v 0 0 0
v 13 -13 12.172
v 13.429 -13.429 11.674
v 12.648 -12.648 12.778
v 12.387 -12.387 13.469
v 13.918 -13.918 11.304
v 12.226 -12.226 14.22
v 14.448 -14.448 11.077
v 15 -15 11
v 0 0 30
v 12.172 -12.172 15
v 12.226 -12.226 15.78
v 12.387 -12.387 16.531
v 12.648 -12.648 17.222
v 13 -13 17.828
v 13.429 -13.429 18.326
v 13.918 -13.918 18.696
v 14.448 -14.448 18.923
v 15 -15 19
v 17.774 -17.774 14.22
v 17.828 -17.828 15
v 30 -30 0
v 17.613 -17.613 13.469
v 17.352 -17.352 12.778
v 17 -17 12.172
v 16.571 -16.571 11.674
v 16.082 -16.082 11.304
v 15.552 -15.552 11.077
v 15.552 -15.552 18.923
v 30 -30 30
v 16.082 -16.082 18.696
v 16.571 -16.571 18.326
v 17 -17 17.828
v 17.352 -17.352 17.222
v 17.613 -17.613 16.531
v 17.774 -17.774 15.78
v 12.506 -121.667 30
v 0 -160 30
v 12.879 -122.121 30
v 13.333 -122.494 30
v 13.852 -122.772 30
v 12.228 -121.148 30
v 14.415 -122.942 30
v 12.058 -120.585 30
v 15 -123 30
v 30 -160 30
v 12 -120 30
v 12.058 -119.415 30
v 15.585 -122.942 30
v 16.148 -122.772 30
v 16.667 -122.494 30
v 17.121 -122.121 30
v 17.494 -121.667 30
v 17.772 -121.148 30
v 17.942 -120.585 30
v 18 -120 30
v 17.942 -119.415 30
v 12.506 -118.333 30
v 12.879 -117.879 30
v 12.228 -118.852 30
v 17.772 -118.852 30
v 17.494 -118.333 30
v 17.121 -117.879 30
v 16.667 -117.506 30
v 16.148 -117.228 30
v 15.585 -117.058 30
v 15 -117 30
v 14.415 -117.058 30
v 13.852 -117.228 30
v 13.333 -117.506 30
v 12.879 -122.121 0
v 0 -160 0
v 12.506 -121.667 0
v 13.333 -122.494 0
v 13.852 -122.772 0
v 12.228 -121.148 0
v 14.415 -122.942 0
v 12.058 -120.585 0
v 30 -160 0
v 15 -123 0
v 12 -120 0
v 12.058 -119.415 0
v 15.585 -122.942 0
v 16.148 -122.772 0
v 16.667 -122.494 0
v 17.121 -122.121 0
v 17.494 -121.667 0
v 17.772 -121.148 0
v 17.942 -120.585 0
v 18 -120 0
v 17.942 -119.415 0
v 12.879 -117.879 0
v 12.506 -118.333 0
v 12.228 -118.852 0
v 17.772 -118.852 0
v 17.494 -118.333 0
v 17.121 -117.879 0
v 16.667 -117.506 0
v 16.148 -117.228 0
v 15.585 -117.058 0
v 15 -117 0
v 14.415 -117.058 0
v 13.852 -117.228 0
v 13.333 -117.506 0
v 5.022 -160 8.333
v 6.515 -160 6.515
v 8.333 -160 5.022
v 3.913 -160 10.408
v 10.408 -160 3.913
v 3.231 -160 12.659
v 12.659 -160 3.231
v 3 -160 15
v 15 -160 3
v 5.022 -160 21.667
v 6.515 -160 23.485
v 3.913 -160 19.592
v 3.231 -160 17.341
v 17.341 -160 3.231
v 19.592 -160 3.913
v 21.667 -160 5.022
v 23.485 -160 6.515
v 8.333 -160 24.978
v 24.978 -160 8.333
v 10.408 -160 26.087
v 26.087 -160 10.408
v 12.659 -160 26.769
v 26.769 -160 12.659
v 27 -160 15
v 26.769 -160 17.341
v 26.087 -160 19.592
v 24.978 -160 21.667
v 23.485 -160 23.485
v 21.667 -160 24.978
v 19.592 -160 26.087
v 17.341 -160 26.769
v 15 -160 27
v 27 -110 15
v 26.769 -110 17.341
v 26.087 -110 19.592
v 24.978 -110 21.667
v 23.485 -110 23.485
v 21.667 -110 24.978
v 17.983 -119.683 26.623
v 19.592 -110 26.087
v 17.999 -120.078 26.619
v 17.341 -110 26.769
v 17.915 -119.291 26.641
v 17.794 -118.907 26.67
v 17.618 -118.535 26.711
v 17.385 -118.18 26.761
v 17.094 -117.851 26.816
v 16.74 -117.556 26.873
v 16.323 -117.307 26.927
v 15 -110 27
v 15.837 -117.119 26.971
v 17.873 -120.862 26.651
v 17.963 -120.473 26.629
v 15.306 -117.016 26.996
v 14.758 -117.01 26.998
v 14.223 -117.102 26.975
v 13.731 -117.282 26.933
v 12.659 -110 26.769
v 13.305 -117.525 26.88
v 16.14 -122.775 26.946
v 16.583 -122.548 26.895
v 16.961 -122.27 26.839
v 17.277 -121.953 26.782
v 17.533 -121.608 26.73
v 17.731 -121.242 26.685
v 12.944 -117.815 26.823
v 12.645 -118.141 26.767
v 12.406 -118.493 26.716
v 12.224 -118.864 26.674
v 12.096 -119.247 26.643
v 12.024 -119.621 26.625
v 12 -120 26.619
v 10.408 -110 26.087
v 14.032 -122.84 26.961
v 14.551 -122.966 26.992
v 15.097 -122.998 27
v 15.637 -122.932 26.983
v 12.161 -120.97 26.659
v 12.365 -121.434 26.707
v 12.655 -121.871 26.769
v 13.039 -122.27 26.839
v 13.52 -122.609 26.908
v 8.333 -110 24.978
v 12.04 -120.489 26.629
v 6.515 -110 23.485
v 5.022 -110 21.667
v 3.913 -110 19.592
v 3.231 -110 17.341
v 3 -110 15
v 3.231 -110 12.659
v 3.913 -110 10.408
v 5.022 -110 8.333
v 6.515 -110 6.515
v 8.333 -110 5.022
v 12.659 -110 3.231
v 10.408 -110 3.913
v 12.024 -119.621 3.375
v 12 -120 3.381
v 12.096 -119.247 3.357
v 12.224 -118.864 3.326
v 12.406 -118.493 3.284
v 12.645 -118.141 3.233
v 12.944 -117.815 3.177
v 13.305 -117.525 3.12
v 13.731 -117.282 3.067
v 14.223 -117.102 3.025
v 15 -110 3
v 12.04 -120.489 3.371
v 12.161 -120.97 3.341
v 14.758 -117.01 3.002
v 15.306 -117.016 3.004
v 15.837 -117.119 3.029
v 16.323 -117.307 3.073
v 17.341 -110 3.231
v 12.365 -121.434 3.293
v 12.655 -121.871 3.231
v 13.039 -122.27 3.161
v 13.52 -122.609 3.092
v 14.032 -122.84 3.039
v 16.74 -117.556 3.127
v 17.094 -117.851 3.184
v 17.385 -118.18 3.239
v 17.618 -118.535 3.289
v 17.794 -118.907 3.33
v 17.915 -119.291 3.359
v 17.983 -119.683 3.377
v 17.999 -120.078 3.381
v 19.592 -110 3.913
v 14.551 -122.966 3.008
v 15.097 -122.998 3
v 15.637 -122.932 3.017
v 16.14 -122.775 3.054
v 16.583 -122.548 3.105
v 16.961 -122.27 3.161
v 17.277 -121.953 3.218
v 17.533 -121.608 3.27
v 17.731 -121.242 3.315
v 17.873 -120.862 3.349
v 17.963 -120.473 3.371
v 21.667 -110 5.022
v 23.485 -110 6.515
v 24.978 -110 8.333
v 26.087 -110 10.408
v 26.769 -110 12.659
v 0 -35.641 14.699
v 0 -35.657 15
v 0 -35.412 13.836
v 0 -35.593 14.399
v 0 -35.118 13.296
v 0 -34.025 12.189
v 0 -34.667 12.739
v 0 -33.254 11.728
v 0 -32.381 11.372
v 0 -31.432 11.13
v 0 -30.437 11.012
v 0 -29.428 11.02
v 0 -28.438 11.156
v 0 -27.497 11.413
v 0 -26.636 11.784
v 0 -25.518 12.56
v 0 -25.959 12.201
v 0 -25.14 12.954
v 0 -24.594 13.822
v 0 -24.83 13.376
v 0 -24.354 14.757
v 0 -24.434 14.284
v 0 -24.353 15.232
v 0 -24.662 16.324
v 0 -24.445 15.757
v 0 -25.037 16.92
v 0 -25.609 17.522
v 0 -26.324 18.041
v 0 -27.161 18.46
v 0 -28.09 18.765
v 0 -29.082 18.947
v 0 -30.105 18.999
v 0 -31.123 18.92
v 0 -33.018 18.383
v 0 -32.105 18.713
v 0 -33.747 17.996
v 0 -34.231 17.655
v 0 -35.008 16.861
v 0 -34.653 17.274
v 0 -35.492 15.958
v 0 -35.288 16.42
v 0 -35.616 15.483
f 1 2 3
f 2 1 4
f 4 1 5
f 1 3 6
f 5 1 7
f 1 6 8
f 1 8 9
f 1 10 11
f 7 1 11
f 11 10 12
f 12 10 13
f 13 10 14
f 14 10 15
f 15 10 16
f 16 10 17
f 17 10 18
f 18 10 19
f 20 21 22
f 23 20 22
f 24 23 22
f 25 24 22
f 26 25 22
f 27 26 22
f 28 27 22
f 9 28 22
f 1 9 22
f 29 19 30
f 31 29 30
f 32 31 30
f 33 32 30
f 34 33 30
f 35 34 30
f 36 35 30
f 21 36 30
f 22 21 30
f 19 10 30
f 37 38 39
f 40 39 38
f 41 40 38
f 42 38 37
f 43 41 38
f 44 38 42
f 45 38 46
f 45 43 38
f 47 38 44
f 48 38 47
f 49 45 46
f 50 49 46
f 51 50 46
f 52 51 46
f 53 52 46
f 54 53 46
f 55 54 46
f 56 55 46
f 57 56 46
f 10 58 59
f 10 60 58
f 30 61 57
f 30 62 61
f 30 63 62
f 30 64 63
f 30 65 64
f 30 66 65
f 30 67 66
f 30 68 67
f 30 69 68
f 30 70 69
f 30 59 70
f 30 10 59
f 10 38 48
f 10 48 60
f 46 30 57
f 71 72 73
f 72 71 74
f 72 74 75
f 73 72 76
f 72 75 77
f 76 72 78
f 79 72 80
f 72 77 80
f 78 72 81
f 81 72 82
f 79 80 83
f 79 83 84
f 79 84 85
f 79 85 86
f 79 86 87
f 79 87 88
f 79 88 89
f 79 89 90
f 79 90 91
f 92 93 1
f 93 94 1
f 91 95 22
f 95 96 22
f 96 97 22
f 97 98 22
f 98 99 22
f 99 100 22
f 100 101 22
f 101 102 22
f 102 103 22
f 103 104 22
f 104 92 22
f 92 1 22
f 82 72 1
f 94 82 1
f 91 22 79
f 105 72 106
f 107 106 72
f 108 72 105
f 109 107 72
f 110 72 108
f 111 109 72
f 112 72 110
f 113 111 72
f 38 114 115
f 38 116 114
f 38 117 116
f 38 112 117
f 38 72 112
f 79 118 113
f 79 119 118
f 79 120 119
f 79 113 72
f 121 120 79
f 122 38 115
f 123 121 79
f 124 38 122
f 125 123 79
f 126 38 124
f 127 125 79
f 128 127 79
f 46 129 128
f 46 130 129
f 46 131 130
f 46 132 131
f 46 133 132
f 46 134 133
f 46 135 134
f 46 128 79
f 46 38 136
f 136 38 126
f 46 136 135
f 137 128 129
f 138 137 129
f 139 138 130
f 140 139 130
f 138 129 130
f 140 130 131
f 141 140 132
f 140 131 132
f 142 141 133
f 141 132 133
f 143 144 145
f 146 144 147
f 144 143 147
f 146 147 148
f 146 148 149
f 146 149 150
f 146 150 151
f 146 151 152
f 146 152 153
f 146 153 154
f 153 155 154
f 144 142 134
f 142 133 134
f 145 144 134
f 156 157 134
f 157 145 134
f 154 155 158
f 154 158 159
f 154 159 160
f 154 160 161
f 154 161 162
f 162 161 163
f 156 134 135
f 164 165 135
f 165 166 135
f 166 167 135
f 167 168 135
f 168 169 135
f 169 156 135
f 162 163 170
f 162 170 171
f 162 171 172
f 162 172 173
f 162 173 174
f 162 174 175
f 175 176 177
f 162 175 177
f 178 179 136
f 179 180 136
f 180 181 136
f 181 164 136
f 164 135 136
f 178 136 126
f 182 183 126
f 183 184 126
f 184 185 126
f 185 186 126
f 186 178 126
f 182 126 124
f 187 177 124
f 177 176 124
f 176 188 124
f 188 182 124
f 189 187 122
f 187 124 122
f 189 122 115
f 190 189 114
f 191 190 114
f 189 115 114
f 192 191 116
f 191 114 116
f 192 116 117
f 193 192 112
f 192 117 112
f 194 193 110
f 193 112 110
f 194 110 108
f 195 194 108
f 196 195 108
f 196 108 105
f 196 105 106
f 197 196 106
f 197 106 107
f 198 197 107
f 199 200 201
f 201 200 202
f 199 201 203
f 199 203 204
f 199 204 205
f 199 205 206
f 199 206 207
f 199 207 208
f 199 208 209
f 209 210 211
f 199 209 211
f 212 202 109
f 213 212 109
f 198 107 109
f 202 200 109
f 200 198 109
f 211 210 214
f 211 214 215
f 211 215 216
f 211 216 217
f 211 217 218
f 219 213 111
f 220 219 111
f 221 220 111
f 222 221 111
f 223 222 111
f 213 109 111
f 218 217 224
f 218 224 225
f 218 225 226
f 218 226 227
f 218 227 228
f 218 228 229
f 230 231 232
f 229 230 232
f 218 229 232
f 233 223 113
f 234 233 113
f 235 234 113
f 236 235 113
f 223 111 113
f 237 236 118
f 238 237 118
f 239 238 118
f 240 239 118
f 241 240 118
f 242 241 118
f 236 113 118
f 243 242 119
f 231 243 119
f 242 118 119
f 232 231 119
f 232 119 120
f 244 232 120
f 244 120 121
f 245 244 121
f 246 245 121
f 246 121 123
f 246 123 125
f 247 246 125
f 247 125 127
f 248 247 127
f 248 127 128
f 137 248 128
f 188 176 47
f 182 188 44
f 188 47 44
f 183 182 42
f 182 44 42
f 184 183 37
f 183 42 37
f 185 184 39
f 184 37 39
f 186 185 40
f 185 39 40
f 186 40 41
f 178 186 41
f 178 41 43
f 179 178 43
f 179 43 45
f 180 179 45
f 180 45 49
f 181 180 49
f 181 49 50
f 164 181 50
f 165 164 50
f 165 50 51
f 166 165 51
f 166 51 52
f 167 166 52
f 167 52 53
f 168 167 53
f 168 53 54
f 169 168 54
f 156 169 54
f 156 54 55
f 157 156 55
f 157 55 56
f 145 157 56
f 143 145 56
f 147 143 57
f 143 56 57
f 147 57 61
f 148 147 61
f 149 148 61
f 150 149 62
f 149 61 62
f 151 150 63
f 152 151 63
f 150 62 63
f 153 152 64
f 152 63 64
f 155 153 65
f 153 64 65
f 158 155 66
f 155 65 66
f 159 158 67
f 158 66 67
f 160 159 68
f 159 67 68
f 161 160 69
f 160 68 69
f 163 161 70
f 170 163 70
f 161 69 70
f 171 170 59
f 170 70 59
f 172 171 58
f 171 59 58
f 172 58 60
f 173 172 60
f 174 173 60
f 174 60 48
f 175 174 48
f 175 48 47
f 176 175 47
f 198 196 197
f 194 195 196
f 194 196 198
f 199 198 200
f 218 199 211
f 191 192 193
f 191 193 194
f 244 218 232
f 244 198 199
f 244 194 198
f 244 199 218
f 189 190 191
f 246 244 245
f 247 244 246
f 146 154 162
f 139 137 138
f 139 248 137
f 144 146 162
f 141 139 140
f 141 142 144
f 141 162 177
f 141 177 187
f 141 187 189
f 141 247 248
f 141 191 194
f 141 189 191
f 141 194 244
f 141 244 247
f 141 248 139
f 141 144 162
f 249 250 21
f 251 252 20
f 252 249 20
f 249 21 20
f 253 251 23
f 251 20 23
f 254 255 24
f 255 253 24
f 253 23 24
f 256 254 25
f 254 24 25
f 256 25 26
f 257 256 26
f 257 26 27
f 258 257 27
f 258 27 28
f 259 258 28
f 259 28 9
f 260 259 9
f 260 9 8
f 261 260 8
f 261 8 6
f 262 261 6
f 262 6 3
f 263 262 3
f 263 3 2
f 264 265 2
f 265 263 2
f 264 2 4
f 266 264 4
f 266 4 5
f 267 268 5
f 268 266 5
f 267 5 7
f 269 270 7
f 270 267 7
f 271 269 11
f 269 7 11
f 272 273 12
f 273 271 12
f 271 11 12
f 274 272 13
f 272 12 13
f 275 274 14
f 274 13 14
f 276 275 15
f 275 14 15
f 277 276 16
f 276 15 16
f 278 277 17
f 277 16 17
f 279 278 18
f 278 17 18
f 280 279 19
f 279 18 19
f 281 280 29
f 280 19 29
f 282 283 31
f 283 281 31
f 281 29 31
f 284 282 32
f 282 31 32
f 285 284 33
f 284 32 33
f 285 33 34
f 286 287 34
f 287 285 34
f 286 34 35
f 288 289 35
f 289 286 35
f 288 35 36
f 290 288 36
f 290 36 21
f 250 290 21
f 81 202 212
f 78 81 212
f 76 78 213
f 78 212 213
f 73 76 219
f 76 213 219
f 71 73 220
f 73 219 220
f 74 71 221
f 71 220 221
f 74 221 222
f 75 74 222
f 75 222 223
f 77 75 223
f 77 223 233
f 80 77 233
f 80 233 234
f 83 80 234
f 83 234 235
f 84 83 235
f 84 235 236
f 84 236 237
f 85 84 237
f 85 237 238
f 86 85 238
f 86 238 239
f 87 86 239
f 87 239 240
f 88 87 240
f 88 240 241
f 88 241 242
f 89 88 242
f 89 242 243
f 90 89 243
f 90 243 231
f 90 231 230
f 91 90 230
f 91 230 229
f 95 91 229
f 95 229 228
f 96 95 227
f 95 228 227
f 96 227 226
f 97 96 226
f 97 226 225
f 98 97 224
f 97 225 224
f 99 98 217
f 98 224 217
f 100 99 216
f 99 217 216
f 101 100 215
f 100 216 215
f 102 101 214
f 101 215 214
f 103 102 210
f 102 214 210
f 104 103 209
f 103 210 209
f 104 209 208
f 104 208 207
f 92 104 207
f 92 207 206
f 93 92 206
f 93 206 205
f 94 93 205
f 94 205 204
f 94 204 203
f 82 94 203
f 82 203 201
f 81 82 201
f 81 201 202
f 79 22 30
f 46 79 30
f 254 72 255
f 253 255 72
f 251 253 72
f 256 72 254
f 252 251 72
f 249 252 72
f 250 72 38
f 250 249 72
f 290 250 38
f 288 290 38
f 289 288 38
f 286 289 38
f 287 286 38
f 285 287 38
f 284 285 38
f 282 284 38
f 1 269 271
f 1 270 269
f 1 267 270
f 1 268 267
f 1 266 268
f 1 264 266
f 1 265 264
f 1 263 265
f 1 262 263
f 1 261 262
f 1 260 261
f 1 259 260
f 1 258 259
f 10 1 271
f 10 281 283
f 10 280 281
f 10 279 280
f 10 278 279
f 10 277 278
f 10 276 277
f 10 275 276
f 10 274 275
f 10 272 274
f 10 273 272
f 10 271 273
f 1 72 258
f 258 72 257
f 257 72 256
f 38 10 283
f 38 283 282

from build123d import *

# Parameters (mm, degrees)
SKETCH_W        = 30
SKETCH_H        = 30
PAD_DEPTH       = 160
POCKET_DEPTH    = 30.001
SKETCH002_R     = 4
POCKET001_DEPTH = 113.138085
SKETCH003_R     = 12
POCKET002_DEPTH = 50
SKETCH004_R     = 3
POCKET003_DEPTH = 30.001


with BuildPart() as part:
    # Sketch → Pad (new body)
    with BuildSketch(Plane.XZ):
        with Locations((15, 15)):
            Rectangle(SKETCH_W, SKETCH_H)
    extrude(amount=PAD_DEPTH)

    # Sketch001 (on Face3 of Pad) → Pocket (cut, through all)
    with BuildSketch(Plane(origin=(0, 0, 30), x_dir=(-1, 0, 0), z_dir=(0, 0, 1))):
        Polygon((0, 0), (-30, 30), (-30, 0), align=None)
    extrude(amount=-POCKET_DEPTH, mode=Mode.SUBTRACT)

    # Sketch002 (on Face2 of Pocket) → Pocket001 (cut, through all)
    with BuildSketch(Plane(origin=(0, 0, 0), x_dir=(0.707107, -0.707107, 0), z_dir=(0.707107, 0.707107, 0))):
        with Locations((21.213203, -15)):
            Circle(SKETCH002_R)
    extrude(amount=-POCKET001_DEPTH, mode=Mode.SUBTRACT)

    # Sketch003 (on Face4 of Pocket001) → Pocket002 (cut)
    with BuildSketch(Plane.XZ.offset(160)):
        with Locations((15, 15)):
            Circle(SKETCH003_R)
    extrude(amount=-POCKET002_DEPTH, mode=Mode.SUBTRACT)

    # Sketch004 (on Face6 of Pocket002) → Pocket003 (cut, through all)
    with BuildSketch(Plane(origin=(0, 0, 30), x_dir=(-1, 0, 0), z_dir=(0, 0, 1))):
        with Locations((-15, 120)):
            Circle(SKETCH004_R)
    extrude(amount=-POCKET003_DEPTH, mode=Mode.SUBTRACT)


solid = part.part
